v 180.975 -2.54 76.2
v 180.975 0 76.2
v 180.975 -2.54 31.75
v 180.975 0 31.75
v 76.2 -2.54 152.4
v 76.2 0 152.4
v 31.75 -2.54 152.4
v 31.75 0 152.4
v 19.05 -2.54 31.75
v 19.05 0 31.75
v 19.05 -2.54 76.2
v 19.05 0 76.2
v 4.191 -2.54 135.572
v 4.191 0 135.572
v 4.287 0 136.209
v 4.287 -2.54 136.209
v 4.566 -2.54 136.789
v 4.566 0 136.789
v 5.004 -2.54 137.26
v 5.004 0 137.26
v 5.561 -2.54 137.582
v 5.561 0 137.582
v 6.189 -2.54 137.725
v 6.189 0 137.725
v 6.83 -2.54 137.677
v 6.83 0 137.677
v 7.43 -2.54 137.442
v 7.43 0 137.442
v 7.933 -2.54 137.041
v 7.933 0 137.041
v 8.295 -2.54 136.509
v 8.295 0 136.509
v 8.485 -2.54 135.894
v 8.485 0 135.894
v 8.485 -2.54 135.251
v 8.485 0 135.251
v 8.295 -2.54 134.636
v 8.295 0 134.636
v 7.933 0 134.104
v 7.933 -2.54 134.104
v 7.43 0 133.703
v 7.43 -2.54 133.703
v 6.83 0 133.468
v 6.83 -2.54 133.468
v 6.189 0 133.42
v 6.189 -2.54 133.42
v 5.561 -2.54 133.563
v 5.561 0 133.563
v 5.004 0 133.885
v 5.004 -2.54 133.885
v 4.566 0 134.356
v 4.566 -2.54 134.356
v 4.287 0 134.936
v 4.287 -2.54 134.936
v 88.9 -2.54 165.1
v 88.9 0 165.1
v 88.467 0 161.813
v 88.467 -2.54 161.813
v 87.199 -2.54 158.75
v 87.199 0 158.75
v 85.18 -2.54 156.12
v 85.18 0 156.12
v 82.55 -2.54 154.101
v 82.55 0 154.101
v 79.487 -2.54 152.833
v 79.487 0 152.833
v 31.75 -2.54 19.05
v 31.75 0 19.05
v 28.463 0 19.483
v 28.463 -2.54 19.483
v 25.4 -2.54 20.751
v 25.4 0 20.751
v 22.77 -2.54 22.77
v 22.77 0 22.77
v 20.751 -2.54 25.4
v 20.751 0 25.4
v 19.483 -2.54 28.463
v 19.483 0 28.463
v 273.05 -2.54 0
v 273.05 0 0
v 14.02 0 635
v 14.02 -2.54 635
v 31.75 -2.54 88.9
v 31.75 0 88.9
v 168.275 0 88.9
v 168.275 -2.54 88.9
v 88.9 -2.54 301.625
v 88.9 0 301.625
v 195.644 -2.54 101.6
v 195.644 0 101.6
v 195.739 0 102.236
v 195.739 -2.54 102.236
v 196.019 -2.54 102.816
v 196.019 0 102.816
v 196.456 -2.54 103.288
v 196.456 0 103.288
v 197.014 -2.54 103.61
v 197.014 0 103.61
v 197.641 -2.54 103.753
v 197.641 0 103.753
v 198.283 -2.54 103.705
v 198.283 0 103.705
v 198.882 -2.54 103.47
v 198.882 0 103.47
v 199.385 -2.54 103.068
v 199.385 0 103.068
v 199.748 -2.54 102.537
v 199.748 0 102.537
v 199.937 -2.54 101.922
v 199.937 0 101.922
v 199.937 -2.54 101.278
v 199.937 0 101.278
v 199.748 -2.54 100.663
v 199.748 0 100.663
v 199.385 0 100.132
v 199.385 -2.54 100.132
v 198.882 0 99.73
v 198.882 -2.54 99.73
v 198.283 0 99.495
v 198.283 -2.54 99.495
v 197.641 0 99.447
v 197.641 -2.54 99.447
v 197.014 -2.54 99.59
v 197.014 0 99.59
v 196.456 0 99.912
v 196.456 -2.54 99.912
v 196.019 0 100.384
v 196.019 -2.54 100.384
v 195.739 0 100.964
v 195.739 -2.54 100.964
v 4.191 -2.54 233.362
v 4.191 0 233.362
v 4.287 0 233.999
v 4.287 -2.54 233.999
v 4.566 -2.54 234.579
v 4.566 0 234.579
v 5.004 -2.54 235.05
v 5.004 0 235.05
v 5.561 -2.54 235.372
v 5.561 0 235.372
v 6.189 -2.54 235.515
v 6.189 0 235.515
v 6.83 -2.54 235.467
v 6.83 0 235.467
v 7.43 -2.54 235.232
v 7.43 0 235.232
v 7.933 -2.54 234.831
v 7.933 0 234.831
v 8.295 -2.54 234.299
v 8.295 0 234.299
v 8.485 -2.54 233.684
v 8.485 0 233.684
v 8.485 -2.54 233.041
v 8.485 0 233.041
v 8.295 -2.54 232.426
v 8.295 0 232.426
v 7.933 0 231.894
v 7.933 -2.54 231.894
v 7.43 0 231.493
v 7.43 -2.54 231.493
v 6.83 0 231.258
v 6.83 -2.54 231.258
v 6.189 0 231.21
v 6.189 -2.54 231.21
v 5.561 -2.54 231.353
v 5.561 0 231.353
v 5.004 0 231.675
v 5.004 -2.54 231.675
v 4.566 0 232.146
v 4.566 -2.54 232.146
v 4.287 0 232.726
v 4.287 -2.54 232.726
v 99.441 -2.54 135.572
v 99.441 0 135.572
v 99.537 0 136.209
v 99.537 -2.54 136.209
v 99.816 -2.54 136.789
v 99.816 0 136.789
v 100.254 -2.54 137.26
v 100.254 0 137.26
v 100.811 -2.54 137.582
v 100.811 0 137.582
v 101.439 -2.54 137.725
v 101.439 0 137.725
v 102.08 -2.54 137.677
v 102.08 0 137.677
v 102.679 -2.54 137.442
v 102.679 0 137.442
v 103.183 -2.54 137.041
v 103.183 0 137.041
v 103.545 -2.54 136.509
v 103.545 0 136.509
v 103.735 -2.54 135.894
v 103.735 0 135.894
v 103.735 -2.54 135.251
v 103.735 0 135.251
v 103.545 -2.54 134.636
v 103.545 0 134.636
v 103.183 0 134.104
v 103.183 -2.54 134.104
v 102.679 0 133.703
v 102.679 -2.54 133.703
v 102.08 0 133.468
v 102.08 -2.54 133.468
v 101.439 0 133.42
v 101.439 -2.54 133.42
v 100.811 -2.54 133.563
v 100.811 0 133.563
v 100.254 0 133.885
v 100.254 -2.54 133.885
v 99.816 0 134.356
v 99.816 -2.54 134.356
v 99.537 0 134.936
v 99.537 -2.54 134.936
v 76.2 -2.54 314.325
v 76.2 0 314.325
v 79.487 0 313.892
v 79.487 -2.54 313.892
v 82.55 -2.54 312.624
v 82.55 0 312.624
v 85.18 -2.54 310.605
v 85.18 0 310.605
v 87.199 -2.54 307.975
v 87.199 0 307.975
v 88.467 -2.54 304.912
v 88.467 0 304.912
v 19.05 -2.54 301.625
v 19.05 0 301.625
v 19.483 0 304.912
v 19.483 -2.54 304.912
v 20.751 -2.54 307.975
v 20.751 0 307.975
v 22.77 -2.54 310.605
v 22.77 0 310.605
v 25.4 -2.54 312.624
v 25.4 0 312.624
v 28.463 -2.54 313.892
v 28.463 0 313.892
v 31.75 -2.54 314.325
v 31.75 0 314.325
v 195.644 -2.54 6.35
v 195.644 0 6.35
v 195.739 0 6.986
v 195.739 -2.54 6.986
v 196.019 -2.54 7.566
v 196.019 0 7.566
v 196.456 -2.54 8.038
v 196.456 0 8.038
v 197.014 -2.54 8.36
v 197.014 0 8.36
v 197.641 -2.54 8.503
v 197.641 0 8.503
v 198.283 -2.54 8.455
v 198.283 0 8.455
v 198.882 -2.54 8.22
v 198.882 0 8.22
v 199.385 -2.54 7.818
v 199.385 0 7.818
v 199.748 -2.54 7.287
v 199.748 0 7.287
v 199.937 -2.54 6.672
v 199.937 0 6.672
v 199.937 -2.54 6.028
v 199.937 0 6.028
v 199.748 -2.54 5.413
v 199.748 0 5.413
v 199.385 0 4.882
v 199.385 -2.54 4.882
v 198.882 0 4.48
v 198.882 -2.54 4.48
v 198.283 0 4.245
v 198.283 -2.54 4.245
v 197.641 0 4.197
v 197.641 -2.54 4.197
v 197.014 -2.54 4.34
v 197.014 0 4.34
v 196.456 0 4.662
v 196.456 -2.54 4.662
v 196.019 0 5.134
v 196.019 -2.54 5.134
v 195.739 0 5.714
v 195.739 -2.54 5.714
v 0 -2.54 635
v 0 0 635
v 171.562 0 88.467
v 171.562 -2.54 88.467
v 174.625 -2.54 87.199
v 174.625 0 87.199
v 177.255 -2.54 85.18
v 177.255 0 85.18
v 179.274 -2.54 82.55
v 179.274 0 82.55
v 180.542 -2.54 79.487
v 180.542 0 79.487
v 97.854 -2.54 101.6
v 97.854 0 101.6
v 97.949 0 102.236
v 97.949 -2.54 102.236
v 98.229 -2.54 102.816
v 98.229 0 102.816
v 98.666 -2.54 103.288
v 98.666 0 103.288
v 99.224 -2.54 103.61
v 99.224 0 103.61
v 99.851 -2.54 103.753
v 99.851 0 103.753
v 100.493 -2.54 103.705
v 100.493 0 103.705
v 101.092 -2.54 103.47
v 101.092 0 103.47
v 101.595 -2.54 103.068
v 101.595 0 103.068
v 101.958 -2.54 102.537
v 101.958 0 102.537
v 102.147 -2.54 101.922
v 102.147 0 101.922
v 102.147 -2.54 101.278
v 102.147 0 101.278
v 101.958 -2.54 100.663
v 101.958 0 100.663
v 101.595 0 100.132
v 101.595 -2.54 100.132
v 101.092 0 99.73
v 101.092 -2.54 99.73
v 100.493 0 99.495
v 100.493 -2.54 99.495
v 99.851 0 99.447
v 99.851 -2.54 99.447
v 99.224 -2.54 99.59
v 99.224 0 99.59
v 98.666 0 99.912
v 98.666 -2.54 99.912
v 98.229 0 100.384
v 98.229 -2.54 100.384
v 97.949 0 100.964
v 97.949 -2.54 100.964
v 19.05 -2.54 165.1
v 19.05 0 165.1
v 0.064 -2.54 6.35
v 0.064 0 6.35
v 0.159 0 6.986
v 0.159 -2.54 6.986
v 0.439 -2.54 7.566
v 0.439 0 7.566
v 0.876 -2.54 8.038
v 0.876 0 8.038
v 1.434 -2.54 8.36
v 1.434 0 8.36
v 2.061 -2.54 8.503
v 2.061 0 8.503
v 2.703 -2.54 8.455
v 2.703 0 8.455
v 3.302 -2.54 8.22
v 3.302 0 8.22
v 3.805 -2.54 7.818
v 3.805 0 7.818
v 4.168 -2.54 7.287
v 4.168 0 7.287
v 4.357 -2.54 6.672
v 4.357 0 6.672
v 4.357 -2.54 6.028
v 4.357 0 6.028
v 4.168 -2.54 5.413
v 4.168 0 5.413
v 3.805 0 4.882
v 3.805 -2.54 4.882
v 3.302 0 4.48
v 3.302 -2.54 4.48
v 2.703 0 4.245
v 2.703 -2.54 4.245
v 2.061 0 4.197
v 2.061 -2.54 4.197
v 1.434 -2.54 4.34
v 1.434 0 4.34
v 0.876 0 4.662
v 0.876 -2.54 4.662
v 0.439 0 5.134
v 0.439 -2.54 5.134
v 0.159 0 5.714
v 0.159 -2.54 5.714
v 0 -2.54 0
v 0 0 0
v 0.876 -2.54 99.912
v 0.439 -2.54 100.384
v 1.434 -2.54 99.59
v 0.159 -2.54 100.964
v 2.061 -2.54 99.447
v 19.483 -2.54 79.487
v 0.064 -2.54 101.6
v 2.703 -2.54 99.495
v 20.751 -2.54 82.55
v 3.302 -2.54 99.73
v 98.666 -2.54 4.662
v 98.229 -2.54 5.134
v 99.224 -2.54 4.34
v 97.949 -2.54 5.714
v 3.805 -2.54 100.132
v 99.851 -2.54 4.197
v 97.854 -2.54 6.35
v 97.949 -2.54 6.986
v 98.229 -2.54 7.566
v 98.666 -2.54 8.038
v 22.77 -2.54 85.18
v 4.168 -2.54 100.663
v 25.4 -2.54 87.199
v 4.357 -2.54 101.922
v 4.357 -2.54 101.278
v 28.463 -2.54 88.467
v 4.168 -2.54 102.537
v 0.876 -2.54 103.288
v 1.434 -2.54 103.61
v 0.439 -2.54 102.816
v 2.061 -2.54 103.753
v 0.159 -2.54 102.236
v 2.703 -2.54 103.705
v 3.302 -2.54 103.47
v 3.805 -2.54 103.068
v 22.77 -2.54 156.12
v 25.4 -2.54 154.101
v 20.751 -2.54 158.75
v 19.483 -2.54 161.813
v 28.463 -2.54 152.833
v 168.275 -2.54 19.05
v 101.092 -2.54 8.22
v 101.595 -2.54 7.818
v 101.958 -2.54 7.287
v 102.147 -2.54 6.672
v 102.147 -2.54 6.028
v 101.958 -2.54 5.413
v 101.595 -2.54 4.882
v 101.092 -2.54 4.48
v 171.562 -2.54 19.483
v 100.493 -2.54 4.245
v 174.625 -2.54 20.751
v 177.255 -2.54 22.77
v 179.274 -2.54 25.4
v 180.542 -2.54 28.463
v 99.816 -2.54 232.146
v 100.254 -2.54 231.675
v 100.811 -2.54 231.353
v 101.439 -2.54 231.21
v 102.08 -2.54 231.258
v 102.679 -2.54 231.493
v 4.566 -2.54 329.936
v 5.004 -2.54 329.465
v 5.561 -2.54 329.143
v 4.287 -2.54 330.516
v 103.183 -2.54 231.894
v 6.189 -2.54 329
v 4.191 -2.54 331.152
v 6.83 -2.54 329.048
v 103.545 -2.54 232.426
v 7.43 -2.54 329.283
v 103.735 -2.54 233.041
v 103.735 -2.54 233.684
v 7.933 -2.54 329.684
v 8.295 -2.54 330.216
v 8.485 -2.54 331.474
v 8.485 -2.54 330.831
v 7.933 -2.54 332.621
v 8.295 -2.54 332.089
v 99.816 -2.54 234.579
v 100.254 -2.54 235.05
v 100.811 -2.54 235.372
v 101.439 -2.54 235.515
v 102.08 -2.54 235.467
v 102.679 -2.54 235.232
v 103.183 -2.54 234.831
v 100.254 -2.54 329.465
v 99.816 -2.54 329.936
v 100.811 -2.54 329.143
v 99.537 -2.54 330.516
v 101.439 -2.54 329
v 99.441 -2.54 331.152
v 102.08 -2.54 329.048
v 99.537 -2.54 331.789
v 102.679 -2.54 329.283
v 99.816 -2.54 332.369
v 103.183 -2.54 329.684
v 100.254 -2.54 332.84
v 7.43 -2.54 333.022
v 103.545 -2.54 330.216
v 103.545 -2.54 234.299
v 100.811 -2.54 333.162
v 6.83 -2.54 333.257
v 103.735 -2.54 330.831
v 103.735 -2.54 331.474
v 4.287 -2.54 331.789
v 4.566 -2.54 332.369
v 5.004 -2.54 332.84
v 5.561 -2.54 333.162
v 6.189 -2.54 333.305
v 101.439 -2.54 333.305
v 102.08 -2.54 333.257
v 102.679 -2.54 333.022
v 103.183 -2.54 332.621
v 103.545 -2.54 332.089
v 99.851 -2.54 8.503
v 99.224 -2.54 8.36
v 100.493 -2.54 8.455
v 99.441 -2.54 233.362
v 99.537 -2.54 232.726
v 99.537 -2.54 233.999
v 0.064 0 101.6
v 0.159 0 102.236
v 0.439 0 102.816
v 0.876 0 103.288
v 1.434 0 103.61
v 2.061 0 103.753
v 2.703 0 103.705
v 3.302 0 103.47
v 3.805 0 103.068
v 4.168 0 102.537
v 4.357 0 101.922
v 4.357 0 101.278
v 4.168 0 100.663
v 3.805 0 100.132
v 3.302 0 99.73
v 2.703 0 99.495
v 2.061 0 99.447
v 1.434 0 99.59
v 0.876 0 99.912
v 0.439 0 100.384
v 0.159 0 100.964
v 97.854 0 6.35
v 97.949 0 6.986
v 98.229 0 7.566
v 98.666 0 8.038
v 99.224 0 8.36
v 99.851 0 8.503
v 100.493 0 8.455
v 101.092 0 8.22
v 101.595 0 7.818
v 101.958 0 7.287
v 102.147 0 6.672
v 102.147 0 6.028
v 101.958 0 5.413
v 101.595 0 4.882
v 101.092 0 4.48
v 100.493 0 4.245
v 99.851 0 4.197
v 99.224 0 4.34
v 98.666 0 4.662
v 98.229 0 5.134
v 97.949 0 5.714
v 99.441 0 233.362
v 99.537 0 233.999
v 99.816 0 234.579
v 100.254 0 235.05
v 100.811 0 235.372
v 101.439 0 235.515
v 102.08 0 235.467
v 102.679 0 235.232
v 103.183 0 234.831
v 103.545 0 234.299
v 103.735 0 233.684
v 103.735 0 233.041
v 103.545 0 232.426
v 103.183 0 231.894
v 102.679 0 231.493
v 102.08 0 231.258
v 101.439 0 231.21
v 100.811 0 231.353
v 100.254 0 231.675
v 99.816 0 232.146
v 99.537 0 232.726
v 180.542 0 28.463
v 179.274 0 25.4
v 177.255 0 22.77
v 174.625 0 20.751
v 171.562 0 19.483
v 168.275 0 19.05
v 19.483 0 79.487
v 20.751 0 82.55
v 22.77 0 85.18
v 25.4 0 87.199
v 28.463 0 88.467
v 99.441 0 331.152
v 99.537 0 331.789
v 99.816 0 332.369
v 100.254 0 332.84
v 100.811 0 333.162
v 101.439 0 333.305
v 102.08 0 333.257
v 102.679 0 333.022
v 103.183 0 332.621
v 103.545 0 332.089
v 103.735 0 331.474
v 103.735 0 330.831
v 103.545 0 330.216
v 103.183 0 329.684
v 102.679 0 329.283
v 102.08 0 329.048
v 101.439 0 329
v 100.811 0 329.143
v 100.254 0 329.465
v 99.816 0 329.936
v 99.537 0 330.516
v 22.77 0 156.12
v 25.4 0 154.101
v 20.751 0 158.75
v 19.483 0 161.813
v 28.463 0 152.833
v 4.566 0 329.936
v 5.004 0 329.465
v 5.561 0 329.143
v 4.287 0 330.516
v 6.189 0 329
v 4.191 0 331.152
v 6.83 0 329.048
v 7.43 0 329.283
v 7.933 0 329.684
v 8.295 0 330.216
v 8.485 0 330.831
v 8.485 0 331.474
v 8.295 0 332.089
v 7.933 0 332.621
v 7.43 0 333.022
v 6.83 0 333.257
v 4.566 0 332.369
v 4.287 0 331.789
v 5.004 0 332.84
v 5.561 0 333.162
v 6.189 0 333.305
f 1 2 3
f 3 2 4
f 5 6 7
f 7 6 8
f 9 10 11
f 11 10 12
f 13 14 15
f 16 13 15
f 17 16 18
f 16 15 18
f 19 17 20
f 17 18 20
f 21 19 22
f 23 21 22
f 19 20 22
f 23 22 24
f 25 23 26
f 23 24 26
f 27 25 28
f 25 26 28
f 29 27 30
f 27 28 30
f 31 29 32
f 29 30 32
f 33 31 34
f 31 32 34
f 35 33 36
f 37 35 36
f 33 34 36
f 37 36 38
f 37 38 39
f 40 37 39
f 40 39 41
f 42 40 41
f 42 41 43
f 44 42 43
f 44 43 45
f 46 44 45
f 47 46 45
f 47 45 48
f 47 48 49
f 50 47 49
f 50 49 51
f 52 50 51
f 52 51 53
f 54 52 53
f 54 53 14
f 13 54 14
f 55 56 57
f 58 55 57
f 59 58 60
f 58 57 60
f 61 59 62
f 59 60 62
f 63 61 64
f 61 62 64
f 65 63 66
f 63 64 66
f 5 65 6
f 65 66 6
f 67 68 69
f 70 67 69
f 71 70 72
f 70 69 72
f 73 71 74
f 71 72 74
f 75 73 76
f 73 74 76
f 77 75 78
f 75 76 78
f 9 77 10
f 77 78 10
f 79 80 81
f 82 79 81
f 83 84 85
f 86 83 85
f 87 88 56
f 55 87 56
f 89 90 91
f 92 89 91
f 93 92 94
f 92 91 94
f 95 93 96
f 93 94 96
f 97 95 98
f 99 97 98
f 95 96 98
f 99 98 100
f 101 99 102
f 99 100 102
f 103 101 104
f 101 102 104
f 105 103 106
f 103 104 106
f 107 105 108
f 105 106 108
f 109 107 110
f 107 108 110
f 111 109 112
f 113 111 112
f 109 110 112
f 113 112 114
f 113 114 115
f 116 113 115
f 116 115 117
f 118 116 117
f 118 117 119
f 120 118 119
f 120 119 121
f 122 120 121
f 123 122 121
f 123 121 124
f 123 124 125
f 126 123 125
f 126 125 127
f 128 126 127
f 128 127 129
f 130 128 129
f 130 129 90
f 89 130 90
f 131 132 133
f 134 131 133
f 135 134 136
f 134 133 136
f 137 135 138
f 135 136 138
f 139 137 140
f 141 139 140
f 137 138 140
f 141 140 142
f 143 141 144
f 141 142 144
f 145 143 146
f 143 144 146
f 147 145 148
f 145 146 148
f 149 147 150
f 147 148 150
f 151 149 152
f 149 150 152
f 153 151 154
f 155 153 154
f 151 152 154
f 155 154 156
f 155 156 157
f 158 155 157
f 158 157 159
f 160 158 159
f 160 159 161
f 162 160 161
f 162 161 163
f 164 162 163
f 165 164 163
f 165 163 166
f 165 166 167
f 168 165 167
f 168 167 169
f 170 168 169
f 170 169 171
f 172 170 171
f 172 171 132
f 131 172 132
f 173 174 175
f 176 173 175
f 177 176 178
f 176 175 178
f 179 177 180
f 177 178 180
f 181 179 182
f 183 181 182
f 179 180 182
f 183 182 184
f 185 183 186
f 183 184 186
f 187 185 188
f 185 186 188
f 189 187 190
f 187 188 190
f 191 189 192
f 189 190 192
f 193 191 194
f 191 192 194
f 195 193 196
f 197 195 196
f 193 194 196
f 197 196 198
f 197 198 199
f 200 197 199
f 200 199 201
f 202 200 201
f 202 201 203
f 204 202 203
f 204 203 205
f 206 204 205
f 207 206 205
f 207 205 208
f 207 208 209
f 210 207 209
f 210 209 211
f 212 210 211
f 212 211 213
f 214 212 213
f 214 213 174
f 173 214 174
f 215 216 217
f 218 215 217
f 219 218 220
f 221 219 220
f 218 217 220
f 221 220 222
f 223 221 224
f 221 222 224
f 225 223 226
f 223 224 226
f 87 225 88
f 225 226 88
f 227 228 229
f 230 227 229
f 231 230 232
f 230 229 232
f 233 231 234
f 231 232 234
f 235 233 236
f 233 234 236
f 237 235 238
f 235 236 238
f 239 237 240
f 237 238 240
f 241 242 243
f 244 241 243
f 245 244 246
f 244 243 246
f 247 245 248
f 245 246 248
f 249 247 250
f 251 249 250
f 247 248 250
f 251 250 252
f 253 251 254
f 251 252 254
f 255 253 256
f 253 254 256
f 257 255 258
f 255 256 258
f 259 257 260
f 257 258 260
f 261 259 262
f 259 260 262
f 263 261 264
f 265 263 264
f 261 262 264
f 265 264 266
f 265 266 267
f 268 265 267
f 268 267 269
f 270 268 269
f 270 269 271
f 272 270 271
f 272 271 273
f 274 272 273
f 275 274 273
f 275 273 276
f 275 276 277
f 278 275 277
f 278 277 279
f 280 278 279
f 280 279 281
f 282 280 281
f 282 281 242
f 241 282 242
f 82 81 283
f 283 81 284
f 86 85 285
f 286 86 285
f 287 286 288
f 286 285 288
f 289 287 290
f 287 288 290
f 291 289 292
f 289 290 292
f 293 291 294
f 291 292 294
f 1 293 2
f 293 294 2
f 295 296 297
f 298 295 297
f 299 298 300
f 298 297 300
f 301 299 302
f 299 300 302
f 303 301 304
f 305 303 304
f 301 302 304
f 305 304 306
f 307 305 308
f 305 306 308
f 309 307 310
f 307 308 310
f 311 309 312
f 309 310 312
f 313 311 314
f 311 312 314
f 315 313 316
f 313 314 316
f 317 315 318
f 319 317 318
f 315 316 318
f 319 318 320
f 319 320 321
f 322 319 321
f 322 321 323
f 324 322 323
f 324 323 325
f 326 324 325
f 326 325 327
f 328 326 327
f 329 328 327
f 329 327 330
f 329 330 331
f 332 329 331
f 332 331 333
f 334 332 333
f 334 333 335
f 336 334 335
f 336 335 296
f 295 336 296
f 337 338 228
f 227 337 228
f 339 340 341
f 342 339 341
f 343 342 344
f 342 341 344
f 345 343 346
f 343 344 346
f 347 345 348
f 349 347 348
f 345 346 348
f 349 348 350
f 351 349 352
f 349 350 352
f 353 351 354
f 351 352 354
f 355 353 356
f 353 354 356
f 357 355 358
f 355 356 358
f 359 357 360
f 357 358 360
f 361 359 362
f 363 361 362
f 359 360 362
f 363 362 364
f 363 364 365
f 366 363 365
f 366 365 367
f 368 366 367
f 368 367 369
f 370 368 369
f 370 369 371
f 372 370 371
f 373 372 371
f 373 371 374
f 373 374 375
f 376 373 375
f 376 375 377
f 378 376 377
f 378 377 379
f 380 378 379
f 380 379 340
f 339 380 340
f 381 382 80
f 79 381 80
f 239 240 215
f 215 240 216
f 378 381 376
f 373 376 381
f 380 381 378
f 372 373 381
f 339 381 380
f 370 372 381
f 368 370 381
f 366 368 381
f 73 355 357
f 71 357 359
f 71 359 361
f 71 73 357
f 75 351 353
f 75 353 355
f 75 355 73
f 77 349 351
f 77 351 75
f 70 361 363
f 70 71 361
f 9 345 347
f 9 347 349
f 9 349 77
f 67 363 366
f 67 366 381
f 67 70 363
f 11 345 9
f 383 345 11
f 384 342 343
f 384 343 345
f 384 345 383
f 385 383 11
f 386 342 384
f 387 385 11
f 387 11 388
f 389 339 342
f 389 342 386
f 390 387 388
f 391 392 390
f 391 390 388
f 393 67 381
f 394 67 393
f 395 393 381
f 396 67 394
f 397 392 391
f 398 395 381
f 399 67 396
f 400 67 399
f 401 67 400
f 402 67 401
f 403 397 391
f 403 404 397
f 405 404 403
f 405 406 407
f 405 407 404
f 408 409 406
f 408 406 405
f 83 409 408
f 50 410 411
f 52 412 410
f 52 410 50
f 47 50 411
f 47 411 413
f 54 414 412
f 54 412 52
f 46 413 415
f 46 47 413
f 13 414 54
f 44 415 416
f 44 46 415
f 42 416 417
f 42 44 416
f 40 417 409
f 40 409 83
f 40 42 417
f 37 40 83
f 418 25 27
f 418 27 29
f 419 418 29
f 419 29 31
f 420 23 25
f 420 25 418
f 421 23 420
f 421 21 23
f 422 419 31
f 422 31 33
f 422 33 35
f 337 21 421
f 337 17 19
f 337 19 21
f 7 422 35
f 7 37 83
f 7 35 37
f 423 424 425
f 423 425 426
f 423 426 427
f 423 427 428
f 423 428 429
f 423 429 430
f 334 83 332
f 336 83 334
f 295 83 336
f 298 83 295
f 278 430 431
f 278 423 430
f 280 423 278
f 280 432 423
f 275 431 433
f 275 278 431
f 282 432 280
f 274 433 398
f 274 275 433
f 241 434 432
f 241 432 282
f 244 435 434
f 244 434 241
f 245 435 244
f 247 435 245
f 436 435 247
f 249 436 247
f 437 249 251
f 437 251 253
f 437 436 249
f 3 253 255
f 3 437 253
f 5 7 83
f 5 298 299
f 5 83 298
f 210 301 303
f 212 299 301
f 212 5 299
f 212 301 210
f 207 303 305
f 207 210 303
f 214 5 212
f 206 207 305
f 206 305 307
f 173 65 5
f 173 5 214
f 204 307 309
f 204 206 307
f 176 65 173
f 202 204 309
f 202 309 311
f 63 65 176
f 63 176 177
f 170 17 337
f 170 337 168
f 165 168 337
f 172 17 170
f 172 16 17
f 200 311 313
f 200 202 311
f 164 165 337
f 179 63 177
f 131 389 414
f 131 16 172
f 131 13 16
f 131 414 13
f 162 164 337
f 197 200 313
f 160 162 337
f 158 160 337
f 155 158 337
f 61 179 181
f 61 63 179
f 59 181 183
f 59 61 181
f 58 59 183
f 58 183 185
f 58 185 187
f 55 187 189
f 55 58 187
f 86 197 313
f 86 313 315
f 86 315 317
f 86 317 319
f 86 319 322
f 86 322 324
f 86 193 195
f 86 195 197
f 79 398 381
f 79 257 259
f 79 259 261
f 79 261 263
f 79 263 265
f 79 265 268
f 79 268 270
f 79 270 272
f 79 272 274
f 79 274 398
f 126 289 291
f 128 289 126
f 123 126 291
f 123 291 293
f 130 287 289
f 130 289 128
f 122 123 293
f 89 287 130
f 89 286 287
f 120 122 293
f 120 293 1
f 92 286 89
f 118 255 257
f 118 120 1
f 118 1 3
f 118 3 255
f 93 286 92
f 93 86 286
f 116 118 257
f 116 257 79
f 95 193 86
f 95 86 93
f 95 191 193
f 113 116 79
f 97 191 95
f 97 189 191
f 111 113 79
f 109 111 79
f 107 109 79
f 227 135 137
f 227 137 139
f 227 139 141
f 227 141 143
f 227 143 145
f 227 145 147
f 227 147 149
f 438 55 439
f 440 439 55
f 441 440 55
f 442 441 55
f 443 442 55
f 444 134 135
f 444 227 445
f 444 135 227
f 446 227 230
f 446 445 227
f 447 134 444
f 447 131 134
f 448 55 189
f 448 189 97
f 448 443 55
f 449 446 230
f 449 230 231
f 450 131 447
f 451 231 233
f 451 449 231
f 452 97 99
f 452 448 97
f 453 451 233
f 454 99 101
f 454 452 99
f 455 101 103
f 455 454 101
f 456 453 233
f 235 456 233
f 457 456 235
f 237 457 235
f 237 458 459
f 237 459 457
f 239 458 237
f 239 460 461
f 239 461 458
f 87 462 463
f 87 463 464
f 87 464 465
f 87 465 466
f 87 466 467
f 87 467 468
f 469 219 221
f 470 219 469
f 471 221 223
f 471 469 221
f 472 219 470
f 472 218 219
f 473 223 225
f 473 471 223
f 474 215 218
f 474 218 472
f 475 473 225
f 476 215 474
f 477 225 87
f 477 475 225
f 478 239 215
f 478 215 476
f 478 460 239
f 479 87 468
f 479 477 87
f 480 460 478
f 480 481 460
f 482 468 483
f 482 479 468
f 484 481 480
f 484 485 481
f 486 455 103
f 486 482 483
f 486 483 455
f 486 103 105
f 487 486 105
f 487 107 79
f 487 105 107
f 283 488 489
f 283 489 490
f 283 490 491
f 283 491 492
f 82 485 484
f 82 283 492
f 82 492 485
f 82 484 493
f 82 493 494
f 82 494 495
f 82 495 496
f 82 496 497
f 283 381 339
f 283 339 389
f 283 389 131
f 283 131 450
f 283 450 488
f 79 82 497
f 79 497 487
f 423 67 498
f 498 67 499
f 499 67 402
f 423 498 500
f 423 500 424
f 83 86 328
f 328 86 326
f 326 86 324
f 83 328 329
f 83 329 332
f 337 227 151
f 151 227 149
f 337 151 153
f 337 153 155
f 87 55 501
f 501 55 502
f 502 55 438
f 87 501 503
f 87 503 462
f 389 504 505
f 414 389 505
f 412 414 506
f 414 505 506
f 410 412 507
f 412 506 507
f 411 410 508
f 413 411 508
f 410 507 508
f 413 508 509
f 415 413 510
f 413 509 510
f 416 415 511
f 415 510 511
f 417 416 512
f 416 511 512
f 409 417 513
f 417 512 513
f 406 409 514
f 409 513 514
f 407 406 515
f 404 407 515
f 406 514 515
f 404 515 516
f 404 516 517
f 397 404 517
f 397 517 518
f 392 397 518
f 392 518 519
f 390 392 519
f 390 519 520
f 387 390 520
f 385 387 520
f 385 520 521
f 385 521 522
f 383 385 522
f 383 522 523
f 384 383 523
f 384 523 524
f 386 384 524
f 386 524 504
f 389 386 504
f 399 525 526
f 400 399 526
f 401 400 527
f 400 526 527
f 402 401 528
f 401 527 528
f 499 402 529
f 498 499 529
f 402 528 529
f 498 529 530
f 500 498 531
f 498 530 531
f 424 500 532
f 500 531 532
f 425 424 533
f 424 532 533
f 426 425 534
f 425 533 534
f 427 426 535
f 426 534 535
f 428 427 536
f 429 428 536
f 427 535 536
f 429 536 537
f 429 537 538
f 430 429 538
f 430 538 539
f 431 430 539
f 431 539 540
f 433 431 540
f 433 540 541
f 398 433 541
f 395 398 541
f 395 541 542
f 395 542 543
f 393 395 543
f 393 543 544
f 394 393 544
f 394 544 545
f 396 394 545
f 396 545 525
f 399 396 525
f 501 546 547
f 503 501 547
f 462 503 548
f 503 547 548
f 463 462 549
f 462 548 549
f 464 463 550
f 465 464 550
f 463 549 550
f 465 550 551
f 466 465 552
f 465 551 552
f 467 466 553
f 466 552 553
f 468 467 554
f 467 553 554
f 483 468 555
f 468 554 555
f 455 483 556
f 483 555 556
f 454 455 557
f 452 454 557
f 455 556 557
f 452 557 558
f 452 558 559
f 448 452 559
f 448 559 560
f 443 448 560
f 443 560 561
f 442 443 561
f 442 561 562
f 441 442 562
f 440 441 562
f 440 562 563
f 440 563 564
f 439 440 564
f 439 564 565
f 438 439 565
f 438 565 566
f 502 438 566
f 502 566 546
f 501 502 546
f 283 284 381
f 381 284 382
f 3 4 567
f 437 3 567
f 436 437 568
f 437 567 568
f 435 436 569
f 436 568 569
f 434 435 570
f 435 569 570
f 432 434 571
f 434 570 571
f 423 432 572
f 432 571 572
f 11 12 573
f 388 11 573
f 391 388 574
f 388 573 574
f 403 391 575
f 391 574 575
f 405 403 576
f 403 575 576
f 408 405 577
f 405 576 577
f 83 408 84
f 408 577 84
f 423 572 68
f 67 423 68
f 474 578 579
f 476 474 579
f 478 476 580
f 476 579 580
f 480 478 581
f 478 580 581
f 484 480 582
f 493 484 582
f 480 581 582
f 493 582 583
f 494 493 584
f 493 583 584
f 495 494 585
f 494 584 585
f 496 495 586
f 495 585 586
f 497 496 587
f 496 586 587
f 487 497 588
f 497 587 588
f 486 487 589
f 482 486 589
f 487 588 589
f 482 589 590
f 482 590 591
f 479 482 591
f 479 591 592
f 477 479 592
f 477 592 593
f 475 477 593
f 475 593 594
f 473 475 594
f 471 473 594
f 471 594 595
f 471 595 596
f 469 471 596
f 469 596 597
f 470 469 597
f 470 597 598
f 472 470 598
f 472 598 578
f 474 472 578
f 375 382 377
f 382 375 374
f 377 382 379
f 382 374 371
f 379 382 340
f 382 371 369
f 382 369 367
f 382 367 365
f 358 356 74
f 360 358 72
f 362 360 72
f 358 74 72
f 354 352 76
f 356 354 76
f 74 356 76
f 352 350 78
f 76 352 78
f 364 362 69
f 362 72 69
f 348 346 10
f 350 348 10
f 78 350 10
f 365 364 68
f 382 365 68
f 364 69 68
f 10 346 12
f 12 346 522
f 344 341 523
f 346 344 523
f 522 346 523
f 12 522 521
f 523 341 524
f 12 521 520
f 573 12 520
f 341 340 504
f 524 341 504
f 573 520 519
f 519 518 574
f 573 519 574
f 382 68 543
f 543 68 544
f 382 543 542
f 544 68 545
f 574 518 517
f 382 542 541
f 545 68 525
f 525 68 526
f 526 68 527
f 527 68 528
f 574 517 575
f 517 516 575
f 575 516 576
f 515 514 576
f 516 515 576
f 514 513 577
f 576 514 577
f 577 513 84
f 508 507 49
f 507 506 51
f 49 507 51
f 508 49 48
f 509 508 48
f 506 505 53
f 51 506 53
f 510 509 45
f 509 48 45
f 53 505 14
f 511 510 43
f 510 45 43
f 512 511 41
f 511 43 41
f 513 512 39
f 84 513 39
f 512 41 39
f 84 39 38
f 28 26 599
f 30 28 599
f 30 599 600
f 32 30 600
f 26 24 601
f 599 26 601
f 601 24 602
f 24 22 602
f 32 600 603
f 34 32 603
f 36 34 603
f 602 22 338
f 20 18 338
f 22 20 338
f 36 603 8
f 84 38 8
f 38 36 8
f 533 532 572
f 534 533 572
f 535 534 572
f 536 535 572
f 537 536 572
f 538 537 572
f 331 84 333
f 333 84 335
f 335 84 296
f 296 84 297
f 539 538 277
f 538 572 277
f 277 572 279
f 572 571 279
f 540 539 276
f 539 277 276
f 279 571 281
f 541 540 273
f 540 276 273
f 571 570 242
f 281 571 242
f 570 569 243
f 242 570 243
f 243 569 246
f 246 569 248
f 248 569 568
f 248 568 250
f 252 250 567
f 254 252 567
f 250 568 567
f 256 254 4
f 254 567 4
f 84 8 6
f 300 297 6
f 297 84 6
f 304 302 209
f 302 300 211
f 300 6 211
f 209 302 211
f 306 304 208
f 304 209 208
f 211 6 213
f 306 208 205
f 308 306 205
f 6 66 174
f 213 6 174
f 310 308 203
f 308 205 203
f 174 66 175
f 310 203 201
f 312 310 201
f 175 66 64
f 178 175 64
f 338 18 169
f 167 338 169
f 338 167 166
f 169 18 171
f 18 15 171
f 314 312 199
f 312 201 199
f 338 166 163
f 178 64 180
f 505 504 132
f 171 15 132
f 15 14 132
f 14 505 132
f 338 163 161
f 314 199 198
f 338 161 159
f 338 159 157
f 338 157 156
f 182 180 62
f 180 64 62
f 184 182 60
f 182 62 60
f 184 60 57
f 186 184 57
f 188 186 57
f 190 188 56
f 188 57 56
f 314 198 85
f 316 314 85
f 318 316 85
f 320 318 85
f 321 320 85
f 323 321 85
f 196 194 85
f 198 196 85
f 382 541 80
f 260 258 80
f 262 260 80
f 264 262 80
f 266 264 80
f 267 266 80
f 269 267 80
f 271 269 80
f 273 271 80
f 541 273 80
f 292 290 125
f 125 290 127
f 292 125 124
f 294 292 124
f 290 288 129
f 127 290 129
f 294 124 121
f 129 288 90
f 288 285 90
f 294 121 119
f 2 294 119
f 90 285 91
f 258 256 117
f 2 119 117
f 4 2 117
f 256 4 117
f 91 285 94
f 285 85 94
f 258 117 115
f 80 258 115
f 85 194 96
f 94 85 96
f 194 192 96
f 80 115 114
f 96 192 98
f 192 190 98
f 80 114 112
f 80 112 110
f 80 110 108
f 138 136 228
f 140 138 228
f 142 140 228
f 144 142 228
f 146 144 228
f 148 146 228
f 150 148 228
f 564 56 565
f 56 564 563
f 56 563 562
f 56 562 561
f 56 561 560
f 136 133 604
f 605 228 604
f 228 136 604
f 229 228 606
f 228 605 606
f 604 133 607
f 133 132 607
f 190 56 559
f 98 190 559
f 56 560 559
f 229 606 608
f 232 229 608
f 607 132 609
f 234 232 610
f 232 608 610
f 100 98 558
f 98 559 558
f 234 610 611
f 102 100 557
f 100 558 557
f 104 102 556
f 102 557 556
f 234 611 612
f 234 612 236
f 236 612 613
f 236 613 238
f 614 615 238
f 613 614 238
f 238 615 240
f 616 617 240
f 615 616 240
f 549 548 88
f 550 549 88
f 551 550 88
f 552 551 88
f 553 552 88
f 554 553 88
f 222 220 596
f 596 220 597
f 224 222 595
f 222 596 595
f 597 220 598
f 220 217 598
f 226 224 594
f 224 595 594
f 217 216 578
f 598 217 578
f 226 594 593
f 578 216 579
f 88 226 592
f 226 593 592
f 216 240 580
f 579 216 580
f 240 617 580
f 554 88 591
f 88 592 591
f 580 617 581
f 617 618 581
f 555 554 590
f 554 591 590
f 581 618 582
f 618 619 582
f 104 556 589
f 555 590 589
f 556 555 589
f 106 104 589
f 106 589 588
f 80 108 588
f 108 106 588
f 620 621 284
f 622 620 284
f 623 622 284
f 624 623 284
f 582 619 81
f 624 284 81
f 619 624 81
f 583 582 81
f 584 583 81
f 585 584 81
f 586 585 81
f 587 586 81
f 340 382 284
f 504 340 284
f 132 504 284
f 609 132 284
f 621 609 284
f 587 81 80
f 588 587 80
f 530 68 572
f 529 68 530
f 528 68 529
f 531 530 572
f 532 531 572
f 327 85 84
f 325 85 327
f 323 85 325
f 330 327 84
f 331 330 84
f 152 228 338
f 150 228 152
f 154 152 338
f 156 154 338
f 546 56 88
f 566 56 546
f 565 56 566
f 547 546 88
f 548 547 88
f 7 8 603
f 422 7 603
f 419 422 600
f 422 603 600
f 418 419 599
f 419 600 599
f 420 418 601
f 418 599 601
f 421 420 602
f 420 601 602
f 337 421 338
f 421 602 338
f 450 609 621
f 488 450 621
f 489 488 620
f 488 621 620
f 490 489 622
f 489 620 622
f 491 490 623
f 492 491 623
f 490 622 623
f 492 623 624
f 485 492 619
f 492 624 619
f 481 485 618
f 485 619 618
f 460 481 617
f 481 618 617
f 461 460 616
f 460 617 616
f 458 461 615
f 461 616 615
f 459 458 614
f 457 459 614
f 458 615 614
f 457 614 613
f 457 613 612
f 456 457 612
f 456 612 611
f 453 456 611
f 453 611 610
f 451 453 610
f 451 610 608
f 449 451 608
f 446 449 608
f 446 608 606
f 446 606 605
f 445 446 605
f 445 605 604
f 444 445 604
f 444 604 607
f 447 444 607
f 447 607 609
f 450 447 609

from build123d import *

# Parameters (mm, degrees)
F1_DEPTH = 2.54
F3_D     = 4.318


with BuildPart() as f1:
    # F0 (on Front) → F1 (new body)
    with BuildSketch(Plane.XZ):
        Polygon((0, 635), (0, 0), (273.05, 0), (14.0198087095, 635), align=None)
        with BuildLine():
            Line((168.275, 19.05), (31.75, 19.05))
            ThreePointArc((31.75, 19.05), (22.7697438789, 22.7697438789), (19.05, 31.75))
            Line((19.05, 31.75), (19.05, 76.2))
            ThreePointArc((19.05, 76.2), (22.7697438789, 85.1802561211), (31.75, 88.9))
            Line((31.75, 88.9), (168.275, 88.9))
            ThreePointArc((168.275, 88.9), (177.2552561211, 85.1802561211), (180.975, 76.2))
            Line((180.975, 76.2), (180.975, 31.75))
            ThreePointArc((180.975, 31.75), (177.2552561211, 22.7697438789), (168.275, 19.05))
        make_face(mode=Mode.SUBTRACT)
        with BuildLine():
            Line((76.2, 152.4), (31.75, 152.4))
            ThreePointArc((31.75, 152.4), (22.7697438789, 156.1197438789), (19.05, 165.1))
            Line((19.05, 165.1), (19.05, 301.625))
            ThreePointArc((19.05, 301.625), (22.7697438789, 310.6052561211), (31.75, 314.325))
            Line((31.75, 314.325), (76.2, 314.325))
            ThreePointArc((76.2, 314.325), (85.1802561211, 310.6052561211), (88.9, 301.625))
            Line((88.9, 301.625), (88.9, 165.1))
            ThreePointArc((88.9, 165.1), (85.1802561211, 156.1197438789), (76.2, 152.4))
        make_face(mode=Mode.SUBTRACT)
    extrude(amount=F1_DEPTH)

    # F3 (through all)
    with Locations(Plane.XZ.offset(2.54)):
        with Locations((6.35, 331.1525), (101.6, 331.1525), (101.6, 233.3625), (6.35, 233.3625), (6.35, 135.5725), (101.6, 135.5725), (2.2225, 101.6), (2.2225, 6.35), (100.0125, 6.35), (100.0125, 101.6), (197.8025, 101.6), (197.8025, 6.35)):
            Hole(F3_D / 2)


solid = f1.part
